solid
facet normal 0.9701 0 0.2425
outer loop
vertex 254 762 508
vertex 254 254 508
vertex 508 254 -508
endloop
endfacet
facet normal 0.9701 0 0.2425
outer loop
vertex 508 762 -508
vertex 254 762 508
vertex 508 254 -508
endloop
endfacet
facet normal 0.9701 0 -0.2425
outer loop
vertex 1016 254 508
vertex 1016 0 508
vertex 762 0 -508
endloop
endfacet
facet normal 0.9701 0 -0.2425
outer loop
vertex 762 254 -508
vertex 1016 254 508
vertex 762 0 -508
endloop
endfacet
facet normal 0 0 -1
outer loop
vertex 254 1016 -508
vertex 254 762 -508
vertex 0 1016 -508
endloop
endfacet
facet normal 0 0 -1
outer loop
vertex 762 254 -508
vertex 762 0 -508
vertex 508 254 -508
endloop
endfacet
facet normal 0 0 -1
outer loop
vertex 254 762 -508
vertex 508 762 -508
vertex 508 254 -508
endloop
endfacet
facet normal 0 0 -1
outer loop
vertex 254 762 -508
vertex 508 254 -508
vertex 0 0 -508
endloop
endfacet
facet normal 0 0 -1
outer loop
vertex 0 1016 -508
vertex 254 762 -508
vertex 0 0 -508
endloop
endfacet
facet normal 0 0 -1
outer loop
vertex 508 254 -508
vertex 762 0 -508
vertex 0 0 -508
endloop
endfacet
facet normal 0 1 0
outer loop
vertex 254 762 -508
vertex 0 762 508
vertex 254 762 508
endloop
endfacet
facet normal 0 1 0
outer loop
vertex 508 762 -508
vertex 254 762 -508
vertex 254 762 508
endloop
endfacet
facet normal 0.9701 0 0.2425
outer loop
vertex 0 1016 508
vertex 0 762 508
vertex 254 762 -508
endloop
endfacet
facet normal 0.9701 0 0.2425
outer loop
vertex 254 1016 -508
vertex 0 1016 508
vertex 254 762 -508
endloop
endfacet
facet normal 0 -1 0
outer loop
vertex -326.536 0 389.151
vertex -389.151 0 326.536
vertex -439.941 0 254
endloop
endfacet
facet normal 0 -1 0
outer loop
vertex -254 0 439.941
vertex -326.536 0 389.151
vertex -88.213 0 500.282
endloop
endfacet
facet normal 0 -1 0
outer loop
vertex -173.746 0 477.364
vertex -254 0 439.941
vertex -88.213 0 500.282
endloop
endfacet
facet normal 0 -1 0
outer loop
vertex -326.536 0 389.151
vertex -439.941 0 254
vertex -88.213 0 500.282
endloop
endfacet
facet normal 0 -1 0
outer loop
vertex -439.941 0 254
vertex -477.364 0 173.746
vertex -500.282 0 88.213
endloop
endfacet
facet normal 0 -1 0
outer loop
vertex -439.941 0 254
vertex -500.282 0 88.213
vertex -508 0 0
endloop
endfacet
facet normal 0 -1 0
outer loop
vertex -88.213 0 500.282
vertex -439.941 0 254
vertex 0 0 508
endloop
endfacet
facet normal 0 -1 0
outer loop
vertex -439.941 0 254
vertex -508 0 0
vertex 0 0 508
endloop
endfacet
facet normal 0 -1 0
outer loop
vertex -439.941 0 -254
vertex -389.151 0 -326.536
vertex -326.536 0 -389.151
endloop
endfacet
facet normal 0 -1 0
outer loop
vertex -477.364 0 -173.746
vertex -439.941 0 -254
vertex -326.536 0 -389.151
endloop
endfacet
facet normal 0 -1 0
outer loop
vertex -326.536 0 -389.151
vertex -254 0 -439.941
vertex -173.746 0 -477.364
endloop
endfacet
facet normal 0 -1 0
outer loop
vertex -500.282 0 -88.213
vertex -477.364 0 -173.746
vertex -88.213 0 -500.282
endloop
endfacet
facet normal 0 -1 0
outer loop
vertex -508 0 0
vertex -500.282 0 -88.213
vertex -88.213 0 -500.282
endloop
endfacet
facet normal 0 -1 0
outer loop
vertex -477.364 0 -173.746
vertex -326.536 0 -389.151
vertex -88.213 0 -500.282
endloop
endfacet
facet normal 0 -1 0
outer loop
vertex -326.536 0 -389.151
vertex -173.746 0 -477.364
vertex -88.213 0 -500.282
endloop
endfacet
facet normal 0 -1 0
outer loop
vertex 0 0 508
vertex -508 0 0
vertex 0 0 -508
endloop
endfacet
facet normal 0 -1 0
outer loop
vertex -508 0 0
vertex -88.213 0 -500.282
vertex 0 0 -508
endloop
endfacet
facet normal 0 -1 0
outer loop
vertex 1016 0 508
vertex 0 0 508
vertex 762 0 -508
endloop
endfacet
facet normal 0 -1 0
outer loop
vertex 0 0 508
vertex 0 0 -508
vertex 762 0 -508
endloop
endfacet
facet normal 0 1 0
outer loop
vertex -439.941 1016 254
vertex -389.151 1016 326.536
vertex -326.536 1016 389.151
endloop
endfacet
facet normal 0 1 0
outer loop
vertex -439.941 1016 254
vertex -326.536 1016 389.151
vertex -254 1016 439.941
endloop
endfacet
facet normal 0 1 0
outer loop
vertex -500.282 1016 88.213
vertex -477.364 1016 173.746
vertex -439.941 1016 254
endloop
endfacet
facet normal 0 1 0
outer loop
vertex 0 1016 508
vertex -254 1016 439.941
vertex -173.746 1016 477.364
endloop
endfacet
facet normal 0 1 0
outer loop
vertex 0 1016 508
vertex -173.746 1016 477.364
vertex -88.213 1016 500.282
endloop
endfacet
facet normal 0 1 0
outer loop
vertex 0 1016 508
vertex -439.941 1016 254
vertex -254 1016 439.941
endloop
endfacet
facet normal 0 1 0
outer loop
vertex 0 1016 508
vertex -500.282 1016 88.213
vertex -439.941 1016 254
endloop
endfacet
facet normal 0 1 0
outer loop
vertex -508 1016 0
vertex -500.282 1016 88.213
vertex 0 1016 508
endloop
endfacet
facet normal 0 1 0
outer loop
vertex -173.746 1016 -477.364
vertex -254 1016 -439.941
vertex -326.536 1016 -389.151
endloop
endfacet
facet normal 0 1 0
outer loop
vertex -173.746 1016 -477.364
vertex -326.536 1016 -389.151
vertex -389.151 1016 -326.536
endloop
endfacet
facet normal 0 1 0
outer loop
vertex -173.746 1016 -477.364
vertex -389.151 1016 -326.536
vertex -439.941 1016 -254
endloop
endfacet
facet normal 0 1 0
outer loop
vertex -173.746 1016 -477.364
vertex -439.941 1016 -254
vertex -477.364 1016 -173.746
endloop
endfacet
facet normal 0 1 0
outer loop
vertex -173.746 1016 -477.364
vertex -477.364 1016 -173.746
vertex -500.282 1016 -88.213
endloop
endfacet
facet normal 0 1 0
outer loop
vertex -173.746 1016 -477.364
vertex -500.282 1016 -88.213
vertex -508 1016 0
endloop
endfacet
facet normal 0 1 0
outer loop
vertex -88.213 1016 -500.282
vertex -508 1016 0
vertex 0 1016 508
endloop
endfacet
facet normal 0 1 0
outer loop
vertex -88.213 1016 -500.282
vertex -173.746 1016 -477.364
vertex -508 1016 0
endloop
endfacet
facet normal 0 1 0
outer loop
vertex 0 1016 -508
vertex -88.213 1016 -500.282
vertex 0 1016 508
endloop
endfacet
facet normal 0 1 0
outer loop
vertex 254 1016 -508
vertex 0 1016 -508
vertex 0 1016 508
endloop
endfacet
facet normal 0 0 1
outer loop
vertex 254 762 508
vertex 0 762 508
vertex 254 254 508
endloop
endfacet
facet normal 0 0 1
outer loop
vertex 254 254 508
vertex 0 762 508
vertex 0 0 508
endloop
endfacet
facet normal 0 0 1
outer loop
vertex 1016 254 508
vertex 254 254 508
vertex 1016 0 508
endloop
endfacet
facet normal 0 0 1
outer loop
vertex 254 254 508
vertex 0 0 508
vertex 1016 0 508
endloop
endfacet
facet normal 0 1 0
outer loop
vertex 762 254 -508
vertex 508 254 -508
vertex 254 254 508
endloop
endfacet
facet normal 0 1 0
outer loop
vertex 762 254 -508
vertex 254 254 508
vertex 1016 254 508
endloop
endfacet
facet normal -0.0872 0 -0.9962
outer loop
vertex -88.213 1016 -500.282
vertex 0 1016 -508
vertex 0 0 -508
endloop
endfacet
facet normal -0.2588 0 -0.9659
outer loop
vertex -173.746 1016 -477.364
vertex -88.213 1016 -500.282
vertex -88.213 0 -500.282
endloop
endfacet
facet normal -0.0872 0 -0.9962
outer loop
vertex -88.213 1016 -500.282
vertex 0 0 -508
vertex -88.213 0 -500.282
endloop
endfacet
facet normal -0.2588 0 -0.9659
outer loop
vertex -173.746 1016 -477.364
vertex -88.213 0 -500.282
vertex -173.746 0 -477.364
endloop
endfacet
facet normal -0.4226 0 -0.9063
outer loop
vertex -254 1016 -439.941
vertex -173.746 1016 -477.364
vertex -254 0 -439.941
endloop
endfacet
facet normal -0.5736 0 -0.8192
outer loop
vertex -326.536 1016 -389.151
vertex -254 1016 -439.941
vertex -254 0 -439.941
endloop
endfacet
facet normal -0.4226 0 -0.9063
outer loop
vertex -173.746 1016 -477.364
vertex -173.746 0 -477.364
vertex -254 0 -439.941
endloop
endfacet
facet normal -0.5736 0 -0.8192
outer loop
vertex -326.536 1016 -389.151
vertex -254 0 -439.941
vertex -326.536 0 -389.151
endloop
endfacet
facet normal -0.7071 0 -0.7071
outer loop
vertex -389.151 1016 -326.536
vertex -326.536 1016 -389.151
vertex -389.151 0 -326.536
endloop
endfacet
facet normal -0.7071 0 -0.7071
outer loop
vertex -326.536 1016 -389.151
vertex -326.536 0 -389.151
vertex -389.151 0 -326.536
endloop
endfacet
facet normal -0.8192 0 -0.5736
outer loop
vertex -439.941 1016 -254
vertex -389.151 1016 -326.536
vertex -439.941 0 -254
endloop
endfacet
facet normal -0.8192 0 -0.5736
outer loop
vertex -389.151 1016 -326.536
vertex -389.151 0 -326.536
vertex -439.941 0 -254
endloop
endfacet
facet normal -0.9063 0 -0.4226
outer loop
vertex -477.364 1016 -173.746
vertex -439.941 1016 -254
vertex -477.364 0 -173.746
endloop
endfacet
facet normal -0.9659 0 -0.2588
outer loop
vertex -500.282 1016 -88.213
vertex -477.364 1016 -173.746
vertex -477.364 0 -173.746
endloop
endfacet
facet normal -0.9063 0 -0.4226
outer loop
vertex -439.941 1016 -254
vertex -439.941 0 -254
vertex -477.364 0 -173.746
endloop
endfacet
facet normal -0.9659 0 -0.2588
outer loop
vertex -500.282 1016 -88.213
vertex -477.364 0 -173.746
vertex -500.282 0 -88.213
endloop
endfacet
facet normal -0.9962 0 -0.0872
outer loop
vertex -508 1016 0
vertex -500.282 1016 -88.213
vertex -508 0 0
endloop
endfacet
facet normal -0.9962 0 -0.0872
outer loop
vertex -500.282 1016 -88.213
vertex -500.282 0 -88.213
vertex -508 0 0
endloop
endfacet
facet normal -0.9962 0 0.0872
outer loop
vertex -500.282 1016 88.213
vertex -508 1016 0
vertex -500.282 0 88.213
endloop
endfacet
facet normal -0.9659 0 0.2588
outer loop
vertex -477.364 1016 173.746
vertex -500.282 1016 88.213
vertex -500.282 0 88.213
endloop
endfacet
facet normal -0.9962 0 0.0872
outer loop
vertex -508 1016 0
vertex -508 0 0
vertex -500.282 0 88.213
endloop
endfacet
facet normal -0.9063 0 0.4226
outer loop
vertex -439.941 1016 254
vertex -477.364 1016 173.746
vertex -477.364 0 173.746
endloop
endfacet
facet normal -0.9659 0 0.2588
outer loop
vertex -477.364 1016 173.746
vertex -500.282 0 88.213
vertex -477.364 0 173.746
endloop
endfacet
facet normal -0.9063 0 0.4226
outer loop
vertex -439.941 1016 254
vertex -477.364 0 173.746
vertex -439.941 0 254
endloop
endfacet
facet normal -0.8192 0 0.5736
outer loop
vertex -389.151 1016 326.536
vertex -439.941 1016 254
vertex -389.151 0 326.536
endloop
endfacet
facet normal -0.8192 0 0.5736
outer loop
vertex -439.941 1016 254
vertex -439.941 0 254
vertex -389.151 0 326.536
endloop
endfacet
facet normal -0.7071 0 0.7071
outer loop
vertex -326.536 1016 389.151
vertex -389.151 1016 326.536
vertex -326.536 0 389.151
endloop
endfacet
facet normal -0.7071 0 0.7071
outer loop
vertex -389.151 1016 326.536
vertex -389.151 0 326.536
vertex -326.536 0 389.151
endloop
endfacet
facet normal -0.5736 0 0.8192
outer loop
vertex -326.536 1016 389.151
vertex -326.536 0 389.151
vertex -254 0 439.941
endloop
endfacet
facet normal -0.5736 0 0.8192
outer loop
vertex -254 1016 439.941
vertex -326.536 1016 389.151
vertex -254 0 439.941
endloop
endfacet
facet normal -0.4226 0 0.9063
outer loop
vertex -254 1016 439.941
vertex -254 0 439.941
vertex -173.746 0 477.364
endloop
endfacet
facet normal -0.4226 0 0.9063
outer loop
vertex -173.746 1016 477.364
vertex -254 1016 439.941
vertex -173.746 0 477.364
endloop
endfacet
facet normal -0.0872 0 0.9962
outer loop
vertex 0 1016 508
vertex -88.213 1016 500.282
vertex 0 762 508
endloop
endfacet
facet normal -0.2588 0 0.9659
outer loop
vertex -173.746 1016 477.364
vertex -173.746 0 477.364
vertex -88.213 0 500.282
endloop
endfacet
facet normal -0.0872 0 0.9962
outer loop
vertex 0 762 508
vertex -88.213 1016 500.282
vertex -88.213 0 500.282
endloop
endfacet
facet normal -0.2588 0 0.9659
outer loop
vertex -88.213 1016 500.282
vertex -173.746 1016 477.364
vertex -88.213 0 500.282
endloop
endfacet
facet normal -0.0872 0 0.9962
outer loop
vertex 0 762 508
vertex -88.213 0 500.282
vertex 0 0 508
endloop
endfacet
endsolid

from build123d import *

# Parameters (mm, degrees)
BOSS_EXTRUDE1_DEPTH = 254
BOSS_EXTRUDE2_DEPTH = 762
BOSS_EXTRUDE3_DEPTH = 1016


with BuildPart() as part:
    # Sketch1 → Boss-Extrude1 (new body)
    with BuildSketch(Plane(origin=(0, 0, 0), x_dir=(1, 0, 0), z_dir=(0, 1, 0))):
        Polygon((762, 508), (508, 508), (254, -508), (1016, -508), align=None)
    extrude(amount=BOSS_EXTRUDE1_DEPTH)

    # Sketch1<3> → Boss-Extrude2 (add)
    with BuildSketch(Plane(origin=(0, 0, 0), x_dir=(1, 0, 0), z_dir=(0, 1, 0))):
        Polygon((508, 508), (254, 508), (0, -508), (254, -508), align=None)
    extrude(amount=BOSS_EXTRUDE2_DEPTH)

    # Sketch1<4> → Boss-Extrude3 (add)
    with BuildSketch(Plane(origin=(0, 0, 0), x_dir=(1, 0, 0), z_dir=(0, 1, 0))):
        with BuildLine():
            Line((254, 508), (0, 508))
            ThreePointArc((0, 508), (-508, 0), (0, -508))
            Line((0, -508), (254, 508))
        make_face()
    extrude(amount=BOSS_EXTRUDE3_DEPTH)


solid = part.part
